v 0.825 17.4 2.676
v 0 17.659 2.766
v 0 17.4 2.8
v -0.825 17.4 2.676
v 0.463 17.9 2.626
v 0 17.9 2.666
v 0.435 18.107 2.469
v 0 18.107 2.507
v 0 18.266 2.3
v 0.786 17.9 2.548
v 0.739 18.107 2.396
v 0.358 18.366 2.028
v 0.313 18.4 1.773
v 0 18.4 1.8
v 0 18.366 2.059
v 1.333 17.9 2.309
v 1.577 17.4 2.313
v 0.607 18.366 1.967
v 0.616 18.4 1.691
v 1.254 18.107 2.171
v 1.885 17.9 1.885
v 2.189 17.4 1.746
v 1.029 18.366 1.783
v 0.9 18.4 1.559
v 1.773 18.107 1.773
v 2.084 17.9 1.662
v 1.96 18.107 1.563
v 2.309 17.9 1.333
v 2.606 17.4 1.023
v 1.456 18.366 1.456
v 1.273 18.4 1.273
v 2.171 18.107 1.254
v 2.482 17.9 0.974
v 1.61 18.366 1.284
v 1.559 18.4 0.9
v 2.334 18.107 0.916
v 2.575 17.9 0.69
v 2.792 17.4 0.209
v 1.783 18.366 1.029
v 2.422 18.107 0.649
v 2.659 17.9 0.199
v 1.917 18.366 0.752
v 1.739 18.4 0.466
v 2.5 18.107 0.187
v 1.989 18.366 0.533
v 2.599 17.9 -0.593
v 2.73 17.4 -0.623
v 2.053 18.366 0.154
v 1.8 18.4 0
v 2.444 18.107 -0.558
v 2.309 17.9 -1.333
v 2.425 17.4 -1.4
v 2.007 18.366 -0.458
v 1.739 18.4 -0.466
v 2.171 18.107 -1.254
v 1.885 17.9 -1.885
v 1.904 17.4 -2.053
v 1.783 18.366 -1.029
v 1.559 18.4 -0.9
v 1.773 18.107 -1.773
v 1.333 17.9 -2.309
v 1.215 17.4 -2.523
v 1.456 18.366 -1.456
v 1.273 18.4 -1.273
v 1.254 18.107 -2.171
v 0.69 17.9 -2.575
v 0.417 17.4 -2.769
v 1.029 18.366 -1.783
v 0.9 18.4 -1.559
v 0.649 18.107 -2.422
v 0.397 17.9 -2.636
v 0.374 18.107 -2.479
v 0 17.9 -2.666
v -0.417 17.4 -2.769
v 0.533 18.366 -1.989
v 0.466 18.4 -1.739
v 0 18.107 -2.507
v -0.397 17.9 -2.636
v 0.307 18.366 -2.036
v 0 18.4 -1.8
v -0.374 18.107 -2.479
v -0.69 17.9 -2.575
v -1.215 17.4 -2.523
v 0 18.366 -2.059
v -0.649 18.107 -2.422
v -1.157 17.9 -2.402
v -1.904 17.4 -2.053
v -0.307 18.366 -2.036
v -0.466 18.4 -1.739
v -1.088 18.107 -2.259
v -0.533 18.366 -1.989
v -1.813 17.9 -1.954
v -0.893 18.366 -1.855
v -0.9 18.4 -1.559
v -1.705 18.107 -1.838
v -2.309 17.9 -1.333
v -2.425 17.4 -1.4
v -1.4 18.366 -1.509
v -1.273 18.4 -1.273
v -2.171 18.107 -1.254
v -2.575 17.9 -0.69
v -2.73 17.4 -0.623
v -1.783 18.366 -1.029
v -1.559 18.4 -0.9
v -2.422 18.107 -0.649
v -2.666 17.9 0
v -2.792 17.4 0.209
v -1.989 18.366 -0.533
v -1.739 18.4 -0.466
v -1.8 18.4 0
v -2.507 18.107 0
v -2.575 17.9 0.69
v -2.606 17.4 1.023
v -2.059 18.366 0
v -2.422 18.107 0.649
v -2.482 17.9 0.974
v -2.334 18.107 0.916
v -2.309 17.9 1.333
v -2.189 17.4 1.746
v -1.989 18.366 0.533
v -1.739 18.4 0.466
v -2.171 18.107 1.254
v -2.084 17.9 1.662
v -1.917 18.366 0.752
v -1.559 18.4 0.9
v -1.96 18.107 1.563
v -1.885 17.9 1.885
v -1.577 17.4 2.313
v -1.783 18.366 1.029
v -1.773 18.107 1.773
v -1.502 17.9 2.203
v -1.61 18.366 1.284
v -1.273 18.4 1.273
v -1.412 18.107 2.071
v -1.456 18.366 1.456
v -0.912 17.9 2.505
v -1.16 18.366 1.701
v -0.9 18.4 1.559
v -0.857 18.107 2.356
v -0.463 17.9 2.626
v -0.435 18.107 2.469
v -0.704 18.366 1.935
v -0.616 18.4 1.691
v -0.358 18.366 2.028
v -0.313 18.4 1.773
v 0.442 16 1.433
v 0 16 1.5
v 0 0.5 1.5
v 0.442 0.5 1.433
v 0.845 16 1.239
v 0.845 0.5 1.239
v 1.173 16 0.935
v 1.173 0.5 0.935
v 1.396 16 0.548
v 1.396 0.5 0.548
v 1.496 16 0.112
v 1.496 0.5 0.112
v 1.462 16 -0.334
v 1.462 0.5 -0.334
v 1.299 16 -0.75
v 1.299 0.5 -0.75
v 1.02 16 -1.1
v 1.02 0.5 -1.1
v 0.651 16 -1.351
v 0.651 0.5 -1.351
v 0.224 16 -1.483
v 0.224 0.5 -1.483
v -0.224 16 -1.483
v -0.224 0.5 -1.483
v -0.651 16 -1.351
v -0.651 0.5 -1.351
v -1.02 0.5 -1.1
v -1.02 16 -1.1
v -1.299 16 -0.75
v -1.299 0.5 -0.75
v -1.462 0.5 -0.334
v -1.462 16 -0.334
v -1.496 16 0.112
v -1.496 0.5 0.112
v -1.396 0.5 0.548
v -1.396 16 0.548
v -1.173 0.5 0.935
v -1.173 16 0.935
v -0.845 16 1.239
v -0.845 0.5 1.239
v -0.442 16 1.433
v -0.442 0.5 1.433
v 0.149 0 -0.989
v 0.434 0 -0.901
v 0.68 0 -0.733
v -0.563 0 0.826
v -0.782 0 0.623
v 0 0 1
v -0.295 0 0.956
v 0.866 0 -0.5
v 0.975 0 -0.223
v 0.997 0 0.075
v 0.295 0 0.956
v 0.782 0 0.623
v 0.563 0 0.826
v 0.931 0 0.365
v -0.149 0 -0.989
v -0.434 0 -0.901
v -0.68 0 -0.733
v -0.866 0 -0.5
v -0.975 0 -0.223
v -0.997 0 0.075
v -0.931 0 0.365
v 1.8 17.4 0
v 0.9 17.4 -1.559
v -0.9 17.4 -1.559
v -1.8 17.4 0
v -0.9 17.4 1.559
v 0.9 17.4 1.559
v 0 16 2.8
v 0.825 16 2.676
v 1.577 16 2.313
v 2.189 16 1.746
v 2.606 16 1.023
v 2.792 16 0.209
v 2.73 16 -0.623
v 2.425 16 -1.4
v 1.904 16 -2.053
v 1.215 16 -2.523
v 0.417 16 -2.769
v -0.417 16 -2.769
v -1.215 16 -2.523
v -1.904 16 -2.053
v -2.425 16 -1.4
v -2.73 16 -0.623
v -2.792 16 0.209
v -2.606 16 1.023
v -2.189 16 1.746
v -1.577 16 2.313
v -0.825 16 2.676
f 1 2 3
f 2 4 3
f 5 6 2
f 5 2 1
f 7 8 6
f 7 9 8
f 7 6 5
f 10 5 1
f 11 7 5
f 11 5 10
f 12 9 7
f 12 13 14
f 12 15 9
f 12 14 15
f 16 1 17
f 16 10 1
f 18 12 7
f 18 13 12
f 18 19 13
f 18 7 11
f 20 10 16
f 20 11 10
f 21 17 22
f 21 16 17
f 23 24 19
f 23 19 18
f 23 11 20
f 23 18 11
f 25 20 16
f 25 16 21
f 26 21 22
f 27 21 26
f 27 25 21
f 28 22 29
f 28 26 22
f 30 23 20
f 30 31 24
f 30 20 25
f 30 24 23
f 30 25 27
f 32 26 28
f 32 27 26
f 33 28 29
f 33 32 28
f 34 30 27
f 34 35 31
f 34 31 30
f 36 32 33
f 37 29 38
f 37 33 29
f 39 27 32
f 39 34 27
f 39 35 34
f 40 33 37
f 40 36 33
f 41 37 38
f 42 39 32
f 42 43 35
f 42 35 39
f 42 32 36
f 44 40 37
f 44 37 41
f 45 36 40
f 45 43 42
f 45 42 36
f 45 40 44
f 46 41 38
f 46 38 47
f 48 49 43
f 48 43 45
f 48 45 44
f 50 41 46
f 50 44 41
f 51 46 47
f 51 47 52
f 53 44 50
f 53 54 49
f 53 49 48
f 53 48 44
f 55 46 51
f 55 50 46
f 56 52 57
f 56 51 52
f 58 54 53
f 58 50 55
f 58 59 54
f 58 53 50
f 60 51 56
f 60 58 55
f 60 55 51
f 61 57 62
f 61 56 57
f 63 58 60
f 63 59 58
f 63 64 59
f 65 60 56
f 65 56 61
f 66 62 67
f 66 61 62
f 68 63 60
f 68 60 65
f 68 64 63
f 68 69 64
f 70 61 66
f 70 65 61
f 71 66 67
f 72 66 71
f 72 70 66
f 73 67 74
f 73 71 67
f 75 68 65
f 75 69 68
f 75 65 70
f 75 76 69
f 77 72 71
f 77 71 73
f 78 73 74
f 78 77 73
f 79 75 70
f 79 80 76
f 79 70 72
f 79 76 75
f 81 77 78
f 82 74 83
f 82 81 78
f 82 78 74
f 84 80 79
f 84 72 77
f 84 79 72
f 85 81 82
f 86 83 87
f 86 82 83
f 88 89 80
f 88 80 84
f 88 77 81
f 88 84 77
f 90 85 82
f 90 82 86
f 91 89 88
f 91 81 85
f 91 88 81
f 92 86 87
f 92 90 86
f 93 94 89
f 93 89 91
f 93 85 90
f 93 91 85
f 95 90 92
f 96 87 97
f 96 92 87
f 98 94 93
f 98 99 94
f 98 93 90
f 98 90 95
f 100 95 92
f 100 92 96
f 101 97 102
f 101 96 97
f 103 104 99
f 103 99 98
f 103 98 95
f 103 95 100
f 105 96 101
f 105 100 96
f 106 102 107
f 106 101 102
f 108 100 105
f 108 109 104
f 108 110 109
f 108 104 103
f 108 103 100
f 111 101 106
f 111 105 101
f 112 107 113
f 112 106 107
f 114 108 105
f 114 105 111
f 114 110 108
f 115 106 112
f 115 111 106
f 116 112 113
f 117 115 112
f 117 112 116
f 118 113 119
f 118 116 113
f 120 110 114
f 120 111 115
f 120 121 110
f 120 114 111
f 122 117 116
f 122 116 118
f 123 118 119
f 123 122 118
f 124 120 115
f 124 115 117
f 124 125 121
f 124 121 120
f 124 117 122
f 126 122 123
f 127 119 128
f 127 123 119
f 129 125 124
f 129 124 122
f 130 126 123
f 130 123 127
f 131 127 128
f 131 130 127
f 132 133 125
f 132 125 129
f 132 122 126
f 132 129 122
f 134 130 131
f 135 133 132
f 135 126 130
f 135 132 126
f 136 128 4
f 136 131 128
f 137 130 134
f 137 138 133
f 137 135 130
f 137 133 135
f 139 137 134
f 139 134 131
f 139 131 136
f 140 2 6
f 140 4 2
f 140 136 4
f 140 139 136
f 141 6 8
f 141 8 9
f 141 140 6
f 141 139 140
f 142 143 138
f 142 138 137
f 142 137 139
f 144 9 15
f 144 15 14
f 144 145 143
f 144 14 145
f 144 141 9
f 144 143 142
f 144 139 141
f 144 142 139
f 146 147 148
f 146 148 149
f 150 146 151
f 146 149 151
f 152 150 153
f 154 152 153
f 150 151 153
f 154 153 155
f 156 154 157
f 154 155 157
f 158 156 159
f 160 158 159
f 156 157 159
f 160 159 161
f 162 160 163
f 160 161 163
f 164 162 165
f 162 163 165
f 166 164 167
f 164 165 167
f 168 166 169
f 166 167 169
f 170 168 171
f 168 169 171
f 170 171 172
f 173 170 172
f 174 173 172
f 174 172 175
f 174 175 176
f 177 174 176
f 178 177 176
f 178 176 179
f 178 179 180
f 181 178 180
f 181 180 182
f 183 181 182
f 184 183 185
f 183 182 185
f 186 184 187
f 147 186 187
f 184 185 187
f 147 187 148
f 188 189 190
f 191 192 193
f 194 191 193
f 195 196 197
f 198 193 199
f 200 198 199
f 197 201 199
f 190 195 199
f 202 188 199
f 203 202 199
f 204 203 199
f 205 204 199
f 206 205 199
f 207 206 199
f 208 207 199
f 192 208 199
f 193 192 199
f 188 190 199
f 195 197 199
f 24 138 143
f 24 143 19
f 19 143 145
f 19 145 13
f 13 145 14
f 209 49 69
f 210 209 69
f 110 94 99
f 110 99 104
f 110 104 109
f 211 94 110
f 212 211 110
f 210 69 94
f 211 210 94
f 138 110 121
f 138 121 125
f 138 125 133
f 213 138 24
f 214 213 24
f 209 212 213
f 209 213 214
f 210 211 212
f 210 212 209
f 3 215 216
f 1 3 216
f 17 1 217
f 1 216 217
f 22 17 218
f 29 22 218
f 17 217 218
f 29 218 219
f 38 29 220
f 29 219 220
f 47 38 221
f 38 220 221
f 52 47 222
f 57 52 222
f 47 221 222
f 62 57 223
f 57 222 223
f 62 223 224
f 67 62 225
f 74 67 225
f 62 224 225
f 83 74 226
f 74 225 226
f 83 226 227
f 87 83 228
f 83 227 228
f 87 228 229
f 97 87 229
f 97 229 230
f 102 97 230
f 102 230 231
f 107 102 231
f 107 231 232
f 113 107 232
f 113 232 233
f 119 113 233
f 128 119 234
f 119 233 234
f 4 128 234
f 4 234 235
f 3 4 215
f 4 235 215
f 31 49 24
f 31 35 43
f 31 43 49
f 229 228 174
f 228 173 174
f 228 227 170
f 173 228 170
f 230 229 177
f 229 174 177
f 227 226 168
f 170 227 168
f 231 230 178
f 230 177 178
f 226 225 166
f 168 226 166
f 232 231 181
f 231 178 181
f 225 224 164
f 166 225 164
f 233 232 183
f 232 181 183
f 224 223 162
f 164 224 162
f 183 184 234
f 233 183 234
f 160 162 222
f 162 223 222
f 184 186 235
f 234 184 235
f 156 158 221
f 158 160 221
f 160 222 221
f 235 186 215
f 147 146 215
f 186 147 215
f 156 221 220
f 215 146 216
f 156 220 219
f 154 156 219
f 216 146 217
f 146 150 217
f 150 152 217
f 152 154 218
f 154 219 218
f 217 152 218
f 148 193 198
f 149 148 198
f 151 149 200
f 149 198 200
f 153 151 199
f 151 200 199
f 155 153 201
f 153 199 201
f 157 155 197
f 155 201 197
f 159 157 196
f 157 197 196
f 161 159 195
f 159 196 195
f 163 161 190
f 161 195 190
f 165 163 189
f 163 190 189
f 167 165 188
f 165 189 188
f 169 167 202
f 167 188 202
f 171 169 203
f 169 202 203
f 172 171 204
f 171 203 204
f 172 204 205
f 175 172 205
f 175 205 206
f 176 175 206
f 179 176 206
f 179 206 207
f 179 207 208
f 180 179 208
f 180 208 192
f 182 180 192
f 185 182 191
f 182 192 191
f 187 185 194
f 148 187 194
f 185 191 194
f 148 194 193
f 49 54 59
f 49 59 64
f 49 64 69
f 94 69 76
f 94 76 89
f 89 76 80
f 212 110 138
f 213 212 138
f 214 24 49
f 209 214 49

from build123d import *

# Parameters (mm, degrees)
SKETCH1_R           = 1.5
BOSS_EXTRUDE1_DEPTH = 16
SKETCH2_R           = 2.8
BOSS_EXTRUDE2_DEPTH = 2.4
FILLET1_R           = 1
CUT_EXTRUDE1_DEPTH  = 1
CHAMFER1_SIZE       = 0.5


with BuildPart() as part:
    # Sketch1 → Boss-Extrude1 (new body)
    with BuildSketch(Plane(origin=(0, 0, 0), x_dir=(1, 0, 0), z_dir=(0, 1, 0))):
        with Locations(Location((0, 0, 0), (0, 0, 270))):
            Circle(SKETCH1_R)
    extrude(amount=BOSS_EXTRUDE1_DEPTH)

    # Sketch2 → Boss-Extrude2 (add)
    with BuildSketch(Plane(origin=(0, 16, 0), x_dir=(1, 0, 0), z_dir=(0, 1, 0))):
        with Locations(Location((0, 0, 0), (0, 0, 270))):
            Circle(SKETCH2_R)
    extrude(amount=BOSS_EXTRUDE2_DEPTH)

    # Fillet1
    fillet1_edges = [part.edges().sort_by_distance(p)[0] for p in [
        (0, 18.4, -2.8),
    ]]
    fillet(fillet1_edges, radius=FILLET1_R)

    # Sketch3 → Cut-Extrude1 (cut)
    with BuildSketch(Plane(origin=(0, 18.4, 0), x_dir=(1, 0, 0), z_dir=(0, 1, 0))):
        Polygon((1.8, 0), (0.9, 1.558845727), (-0.9, 1.558845727), (-1.8, 0), (-0.9, -1.558845727), (0.9, -1.558845727), align=None)
    extrude(amount=-CUT_EXTRUDE1_DEPTH, mode=Mode.SUBTRACT)

    # Chamfer1
    chamfer1_edges = [part.edges().sort_by_distance(p)[0] for p in [
        (0, 0, -1.5),
    ]]
    chamfer(chamfer1_edges, length=CHAMFER1_SIZE)


solid = part.part
